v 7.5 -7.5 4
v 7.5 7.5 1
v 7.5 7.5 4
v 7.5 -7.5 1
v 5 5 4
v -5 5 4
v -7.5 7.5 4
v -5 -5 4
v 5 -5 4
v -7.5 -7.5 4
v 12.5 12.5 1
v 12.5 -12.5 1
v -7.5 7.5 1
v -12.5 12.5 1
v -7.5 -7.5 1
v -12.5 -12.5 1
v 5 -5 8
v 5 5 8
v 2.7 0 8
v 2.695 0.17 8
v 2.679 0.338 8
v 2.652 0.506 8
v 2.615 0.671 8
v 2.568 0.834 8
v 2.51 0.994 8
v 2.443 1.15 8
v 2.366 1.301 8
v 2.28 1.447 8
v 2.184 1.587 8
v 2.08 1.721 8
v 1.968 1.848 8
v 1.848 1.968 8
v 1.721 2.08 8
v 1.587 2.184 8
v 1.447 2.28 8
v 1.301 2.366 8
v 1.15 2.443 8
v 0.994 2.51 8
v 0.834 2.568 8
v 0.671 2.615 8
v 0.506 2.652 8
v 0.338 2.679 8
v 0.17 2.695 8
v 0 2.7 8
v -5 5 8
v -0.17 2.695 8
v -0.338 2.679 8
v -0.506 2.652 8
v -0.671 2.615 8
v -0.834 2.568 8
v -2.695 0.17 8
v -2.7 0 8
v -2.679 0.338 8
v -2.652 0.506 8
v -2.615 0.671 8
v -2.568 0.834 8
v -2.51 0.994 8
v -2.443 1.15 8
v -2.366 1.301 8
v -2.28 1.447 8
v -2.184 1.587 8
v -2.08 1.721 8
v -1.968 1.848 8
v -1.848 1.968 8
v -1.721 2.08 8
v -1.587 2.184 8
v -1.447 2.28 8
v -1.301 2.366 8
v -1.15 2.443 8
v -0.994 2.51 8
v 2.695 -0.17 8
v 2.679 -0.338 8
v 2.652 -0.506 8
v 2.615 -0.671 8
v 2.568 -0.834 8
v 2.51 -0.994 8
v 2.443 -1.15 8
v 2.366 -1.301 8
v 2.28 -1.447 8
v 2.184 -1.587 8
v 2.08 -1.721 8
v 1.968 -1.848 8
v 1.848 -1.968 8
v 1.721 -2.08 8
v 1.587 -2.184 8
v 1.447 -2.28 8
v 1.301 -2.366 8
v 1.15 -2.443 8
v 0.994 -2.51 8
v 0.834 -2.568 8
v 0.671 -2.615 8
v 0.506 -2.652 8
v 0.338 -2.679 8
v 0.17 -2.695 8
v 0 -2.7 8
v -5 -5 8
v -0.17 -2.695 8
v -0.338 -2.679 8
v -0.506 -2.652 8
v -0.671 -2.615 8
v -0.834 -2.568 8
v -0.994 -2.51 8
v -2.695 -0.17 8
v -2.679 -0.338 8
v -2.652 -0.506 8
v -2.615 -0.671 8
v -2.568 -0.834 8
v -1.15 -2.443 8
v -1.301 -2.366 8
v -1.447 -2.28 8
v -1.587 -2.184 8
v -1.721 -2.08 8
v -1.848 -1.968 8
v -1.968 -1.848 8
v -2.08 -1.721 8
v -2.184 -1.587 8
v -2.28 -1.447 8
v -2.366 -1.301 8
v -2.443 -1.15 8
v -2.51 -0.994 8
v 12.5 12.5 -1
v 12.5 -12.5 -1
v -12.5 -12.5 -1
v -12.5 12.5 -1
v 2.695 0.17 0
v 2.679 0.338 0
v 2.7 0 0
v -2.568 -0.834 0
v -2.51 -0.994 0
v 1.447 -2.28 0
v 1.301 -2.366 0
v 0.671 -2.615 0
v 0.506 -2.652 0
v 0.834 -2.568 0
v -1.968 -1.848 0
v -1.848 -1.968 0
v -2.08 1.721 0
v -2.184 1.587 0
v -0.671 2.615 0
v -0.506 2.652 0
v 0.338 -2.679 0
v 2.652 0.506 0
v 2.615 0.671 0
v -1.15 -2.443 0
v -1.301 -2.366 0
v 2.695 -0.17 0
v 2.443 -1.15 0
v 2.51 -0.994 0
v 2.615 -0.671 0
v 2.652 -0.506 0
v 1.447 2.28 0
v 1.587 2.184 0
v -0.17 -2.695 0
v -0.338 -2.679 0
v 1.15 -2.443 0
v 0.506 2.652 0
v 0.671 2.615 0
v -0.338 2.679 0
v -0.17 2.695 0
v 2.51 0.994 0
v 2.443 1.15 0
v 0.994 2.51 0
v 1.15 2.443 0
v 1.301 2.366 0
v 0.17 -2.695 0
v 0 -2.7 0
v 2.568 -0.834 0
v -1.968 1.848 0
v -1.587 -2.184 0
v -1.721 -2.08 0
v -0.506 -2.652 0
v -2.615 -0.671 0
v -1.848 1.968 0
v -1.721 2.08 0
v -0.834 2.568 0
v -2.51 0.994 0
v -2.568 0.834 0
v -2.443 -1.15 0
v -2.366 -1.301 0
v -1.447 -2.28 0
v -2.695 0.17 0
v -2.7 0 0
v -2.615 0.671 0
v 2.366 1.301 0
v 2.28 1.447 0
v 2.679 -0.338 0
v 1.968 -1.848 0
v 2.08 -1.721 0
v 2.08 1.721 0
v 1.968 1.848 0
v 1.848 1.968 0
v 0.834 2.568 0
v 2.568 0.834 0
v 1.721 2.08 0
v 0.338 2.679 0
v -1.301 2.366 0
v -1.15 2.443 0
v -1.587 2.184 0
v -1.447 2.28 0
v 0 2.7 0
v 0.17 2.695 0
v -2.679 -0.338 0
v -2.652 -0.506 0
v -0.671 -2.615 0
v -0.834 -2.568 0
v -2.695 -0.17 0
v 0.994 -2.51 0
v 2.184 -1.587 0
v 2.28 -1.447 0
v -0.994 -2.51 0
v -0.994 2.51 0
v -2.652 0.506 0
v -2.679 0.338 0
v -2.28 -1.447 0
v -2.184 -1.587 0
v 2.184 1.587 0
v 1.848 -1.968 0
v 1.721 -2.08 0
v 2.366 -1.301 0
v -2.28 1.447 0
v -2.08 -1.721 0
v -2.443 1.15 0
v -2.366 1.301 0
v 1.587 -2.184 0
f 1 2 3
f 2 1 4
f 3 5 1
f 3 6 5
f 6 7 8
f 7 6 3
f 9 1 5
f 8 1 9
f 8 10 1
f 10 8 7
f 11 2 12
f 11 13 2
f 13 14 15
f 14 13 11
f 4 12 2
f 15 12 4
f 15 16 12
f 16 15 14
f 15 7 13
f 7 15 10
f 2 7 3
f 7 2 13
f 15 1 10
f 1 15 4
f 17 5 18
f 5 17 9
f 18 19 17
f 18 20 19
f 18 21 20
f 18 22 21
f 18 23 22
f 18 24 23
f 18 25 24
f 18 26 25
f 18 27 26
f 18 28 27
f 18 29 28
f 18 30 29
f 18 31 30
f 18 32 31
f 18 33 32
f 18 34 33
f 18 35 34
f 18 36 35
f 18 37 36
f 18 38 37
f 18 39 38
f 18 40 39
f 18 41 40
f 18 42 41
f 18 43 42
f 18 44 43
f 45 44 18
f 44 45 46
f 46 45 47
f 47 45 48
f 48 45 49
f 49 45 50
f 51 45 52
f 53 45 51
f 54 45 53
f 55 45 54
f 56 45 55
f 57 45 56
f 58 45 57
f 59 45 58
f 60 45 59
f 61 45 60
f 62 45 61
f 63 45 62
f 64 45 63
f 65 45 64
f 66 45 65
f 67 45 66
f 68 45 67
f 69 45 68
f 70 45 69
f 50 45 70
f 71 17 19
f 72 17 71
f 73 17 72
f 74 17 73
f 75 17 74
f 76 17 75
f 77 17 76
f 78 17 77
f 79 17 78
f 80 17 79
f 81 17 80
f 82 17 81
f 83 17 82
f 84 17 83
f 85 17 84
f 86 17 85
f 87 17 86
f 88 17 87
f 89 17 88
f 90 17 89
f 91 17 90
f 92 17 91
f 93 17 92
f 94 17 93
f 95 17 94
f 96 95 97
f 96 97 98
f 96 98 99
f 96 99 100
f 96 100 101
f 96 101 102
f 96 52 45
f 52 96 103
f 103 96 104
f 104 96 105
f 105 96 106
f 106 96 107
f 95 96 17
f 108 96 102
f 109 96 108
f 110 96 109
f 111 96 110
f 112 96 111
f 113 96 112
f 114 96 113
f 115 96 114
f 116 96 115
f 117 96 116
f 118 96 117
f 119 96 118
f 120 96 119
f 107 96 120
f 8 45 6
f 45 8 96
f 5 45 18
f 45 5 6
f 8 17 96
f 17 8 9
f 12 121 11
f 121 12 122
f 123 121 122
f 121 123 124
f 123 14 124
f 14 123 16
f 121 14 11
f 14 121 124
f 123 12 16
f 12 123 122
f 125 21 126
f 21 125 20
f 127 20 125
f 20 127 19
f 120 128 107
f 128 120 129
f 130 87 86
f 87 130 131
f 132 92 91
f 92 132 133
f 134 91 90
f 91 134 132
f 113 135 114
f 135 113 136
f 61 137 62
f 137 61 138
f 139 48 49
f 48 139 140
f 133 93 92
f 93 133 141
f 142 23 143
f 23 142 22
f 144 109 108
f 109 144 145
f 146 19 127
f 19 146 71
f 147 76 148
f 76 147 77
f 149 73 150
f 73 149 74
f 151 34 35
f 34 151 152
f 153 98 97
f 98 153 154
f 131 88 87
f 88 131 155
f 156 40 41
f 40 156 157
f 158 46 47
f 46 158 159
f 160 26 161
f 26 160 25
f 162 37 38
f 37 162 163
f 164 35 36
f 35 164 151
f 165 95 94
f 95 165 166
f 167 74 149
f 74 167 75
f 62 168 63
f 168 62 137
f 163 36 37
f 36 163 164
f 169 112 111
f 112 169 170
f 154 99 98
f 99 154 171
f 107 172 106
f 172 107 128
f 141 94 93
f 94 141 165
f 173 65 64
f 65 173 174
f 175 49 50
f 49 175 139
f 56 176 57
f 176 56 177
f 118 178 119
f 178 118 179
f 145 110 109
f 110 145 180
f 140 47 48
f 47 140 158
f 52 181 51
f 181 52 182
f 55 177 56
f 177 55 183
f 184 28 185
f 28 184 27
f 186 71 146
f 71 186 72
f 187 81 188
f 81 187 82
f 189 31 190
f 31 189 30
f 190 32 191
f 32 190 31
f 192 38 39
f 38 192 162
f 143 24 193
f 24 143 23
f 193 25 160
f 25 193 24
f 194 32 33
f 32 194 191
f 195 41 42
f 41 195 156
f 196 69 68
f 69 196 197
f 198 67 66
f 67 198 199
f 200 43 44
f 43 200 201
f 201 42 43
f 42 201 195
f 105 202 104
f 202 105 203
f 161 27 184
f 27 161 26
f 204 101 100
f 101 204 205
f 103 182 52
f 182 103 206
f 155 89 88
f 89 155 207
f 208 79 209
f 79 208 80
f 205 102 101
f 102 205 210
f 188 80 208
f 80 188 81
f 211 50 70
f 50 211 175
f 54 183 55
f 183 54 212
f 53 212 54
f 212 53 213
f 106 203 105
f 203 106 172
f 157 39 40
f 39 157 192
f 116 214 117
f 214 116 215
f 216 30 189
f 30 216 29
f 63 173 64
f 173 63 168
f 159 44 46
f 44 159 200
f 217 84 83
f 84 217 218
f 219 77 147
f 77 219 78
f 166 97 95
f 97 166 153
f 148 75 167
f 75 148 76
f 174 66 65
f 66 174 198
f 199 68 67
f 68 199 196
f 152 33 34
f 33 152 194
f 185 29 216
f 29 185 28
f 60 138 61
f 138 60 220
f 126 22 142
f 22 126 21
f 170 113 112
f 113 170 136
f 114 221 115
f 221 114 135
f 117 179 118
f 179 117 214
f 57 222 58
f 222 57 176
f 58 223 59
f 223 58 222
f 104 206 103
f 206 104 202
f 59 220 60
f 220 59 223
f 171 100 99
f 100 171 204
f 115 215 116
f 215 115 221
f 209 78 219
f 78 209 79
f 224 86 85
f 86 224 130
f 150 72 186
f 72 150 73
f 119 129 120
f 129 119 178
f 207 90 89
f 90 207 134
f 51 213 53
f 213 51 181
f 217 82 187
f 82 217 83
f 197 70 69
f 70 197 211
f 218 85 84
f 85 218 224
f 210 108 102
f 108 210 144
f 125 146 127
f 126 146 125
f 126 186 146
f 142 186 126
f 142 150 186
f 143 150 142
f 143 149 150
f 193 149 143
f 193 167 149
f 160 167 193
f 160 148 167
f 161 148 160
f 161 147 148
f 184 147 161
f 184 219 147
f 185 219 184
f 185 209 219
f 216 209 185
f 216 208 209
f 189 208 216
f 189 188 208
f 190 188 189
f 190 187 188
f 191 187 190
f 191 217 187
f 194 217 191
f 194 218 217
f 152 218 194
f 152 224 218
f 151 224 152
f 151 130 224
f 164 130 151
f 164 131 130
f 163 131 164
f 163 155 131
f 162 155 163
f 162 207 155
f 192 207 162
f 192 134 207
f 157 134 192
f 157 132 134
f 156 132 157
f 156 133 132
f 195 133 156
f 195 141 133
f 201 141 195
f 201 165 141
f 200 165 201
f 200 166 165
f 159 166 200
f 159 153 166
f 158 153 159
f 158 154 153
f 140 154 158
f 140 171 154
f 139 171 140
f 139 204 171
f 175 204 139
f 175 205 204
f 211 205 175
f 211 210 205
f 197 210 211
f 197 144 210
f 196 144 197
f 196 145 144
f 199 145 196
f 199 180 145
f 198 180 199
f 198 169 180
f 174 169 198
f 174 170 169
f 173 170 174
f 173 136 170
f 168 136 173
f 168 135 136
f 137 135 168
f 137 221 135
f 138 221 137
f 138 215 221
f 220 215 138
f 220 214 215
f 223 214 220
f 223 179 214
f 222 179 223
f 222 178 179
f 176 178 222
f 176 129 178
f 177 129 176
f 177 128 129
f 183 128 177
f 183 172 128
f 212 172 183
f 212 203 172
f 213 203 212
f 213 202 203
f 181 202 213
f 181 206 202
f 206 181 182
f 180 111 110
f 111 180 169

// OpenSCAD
// file: relativity.scad
_digit = "0123456789";
_lowercase = "abcdefghijklmnopqrstuvwxyz";
_uppercase = "ABCDEFGHIJKLMNOPQRSTUVWXYZ";
_letter = str(_lowercase, _uppercase);
_alphanumeric = str(_letter, _digit);
_variable_safe = str(_alphanumeric, "_");
_whitespace = " \t\r\n";
_nonsymbol = str(_alphanumeric, _whitespace);

_regex_ops = "?*+&|";

_strings_version = 
	[2014, 3, 17];
function strings_version() =
	_strings_version;
function strings_version_num() =
	_strings_version.x * 10000 + _strings_version.y * 100 + _strings_version.z;






//returns a list representing the tokenization of an input string
//echo(tokenize("not(foo)"));
//echo(tokenize("foo bar baz  "));
_token_regex_ignore_space = _parse_rx("\\w+|\\S");
_token_regex = _parse_rx("\\w+|\\S|\\s+");
function tokenize(string, ignore_space=true) = 
    _tokenize(string, ignore_space? _token_regex_ignore_space : _token_regex);
function _tokenize(string, pattern) = 
    _grep(string, _index_of(string, pattern, regex=true));

function grep(string, pattern, ignore_case=false) = 		//string
    _grep(string, _index_of(string, _parse_rx(pattern), regex=true, ignore_case=ignore_case));
function _grep(string, indices) = 
    [for (index = indices)
        between(string, index.x, index.y)
    ];


function replace(string, replaced, replacement, ignore_case=false, regex=false) = 
	_replace(string, replacement, index_of(string, replaced, ignore_case=ignore_case, regex=regex));
    
function _replace(string, replacement, indices, i=0) = 
    i >= len(indices)?
        after(string, indices[len(indices)-1].y-1)
    : i == 0?
        str( before(string, indices[0].x), replacement, _replace(string, replacement, indices, i+1) )
    :
        str( between(string, indices[i-1].y, indices[i].x), replacement, _replace(string, replacement, indices, i+1) )
    ;


function split(string, seperator=" ", ignore_case = false, regex=false) = 
	_split(string, index_of(string, seperator, ignore_case=ignore_case, regex=regex));
    
function _split(string, indices, i=0) = 
    len(indices) == 0?
        [string]
    : i >= len(indices)?
        _coalesce_on(after(string, indices[len(indices)-1].y-1), "", [])
    : i == 0?
        concat( _coalesce_on(before(string, indices[0].x), "", []), _split(string, indices, i+1) )
    :
        concat( between(string, indices[i-1].y, indices[i].x), _split(string, indices, i+1) )
    ;

function contains(string, substring, ignore_case=false, regex=false) = 
	regex?
        _index_of_first(string, _parse_rx(substring), regex=regex, ignore_case=ignore_case) != undef
	:
		_index_of_first(string, substring, regex=regex, ignore_case=ignore_case) != undef
	; 
	


function index_of(string, pattern, ignore_case=false, regex=false) = 
	_index_of(string, 
        regex? _parse_rx(pattern) : pattern, 
        regex=regex, 
        ignore_case=ignore_case);
function _index_of(string, pattern, pos=0, regex=false, ignore_case=false) = 		//[start,end]
	pos == undef?
        undef
	: pos >= len(string)?
		[]
	:
        _index_of_recurse(string, pattern, 
            _index_of_first(string, pattern, pos=pos, regex=regex, ignore_case=ignore_case),
            pos, regex, ignore_case)
	;
function _index_of_recurse(string, pattern, index_of_first, pos, regex, ignore_case) = 
    index_of_first == undef?
        []
    : concat(
        [index_of_first],
        _coalesce_on(
            _index_of(string, pattern, 
                    pos = index_of_first.y,
                    regex=regex,
                    ignore_case=ignore_case),
            undef,
            [])
    );
function _index_of_first(string, pattern, pos=0, ignore_case=false, regex=false) =
	pos == undef?
        undef
    : pos >= len(string)?
		undef
	: _coalesce_on([pos, _match(string, pattern, pos, regex=regex, ignore_case=ignore_case)], 
		[pos, undef],
		_index_of_first(string, pattern, pos+1, regex=regex, ignore_case=ignore_case))
    ;
function _match(string, pattern, pos, regex=false, ignore_case=false) = 
    regex?
        _match_parsed_rx(string, pattern, pos, ignore_case=ignore_case)
    : starts_with(string, pattern, pos, ignore_case=ignore_case)? 
        pos+len(pattern) 
    : 
        undef
    ;
    
    
function starts_with(string, start, pos=0, ignore_case=false, regex=false) = 
	regex?
		_match_parsed_rx(string,
			_parse_rx(start), 
			pos, 
			ignore_case=ignore_case) != undef
	:
		equals(	substring(string, pos, len(start)), 
			start, 
			ignore_case=ignore_case)
	;
function ends_with(string, end, ignore_case=false) =
	equals(	after(string, len(string)-len(end)-1), 
		end,
		ignore_case=ignore_case)
	;







function _match_regex(string, pattern, pos=0, ignore_case=false) = 		//end pos
	_match_parsed_rx(string,
		_parse_rx(pattern), 
		pos, 
		ignore_case=ignore_case);
	
//converts an infix notated regex string to a parse tree using the shunting yard algorithm
function _parse_rx(	rx, 		ops=[], 	args=[], 				i=0) = 
	rx == undef?
		undef
	: i >= len(rx)?
		len(ops) <= 0?
			args[0]
		:
			_parse_rx(rx, _pop(ops), 	_push_rx_op(args, ops[0]), 		i)
			
			
	: ops[0] == "{"?
		rx[i] == "}"?
			_parse_rx(rx, _pop(ops), 	_push_rx_op(args, ops[0]), 		 i+1)
		: rx[i] == ","?
			_parse_rx(rx, ops, 		_swap(args, _push(args[0], "")), 	 i+1)
		: 
			_parse_rx(rx, ops, 		_swap(args, _swap(args[0], str(args[0][0], rx[i]))), i+1)
			
			
	: ops[0] == "[" || ops[0] == "[^"?
		rx[i] == "]"?
			_parse_rx(rx, _pop(ops), 	_push_rx_op(args, ops[0]), 		i+1)
		: rx[i] == "\\"?
			_parse_rx(rx, ops, 		_swap(args, _push(args[0],rx[i+1])), 	i+2)
		: rx[i] == "-"?
			_parse_rx(rx, ops, 		_swap(args, _push(_pop(args[0]), ["-", args[0][0], rx[i+1]])), i+2)
		:
			_parse_rx(rx, ops, 		_swap(args, _push(args[0], rx[i])), 	i+1)
	: rx[i] == "[" && rx[i+1] == "^"?
		!_can_concat(rx, i)?
			_parse_rx(rx, _push(ops, "[^"),	_push(args, []),	 		i+2)
		: _can_shunt(ops, "&")?
			_parse_rx(rx, _push(_push(ops,"&"),"[^"), _push(args, []), i+2)
		:
			_parse_rx(rx, _pop(ops), 	_push_rx_op(args, ops[0]), 		i)
	: rx[i] == "["?
		!_can_concat(rx, i)?
			_parse_rx(rx, _push(ops, "["), 	_push(args, []),	 		i+1)
		: _can_shunt(ops, "&")?
			_parse_rx(rx, _push(_push(ops,"&"),"["), _push(args, []), i+1)
		:
			_parse_rx(rx, _pop(ops), 	_push_rx_op(args, ops[0]), 		i)
			
	: rx[i] == "{"?
			_parse_rx(rx, _push(ops, "{"),	_push(args, ["", []]), 			i+1)
			
			
	: is_in(rx[i], _regex_ops)?
		_can_shunt(ops, rx[i])?
			_parse_rx(rx, _push(ops, rx[i]), args, 		 		i+1)
		:
			_parse_rx(rx, _pop(ops), 	_push_rx_op(args, ops[0]), 		i)
	: rx[i] == ")"?
		ops[0] == "(" ?
			_parse_rx(rx, _pop(ops), 	args,			 		i+1)
		: len(ops) <= 0 ?
			_parse_rx(rx, ops, 		args,			 		i+1)
		: 
			_parse_rx(rx, _pop(ops), 	_push_rx_op(args, ops[0]), 		i)
	: rx[i] == "("?
		!_can_concat(rx, i)?
			_parse_rx(rx, _push(ops, "("), 	args, 		 			i+1)
		: _can_shunt(ops, "&")?
			_parse_rx(rx, _push(_push(ops, "&"), "("), args, 	 		i+1)
		:
			_parse_rx(rx, _pop(ops), 	_push_rx_op(args, ops[0]), 		i)
	: rx[i] == "\\"?
		!_can_concat(rx, i)?
			_parse_rx(rx, ops, 			_push(args,str(rx[i],rx[i+1])),	i+2)
		: _can_shunt(ops, "&")?
			_parse_rx(rx, _push(ops, "&"),	_push(args,str(rx[i],rx[i+1])),	i+2)
		:
			_parse_rx(rx, _pop(ops), 	_push_rx_op(args, ops[0]), 		i)
	:
		!_can_concat(rx, i)?
			_parse_rx(rx, ops, 		_push(args, rx[i]),	 		i+1)
		: _can_shunt(ops, "&")?
			_parse_rx(rx, _push(ops, "&"),	_push(args, rx[i]),	 		i+1)
		:
			_parse_rx(rx, _pop(ops), 	_push_rx_op(args, ops[0]), 		i)
	;

	
function _can_concat(regex, i) = 
	regex[i-1] != undef &&
	(!is_in(regex[i-1], "|(") || regex[i-2] == "\\");
	
function _can_shunt(stack, op) = 
	stack[0] == "(" || 
	len(stack) <= 0 || 
	_precedence(op, _regex_ops) < _precedence(stack[0], _regex_ops);
	
function _push_rx_op(stack, op) = 
	is_in(op[0], "[?*+")? // is unary?
		_push(_pop(stack), 	[op, stack[0]])
	: 		 	// is binary?
		_push(_pop(stack,2), 	[op, stack[1][0], stack[0], ])
	;

function _swap(stack, replacement) = 
	_push(_pop(stack), replacement);
function _pop(stack, n=1) = 
	n <= 1?
		len(stack) <=0? [] : stack[1]
	:
		_pop(_pop(stack), n-1)
	;
function _push(stack, char) = 
	[char, stack];

function _precedence(op, ops) = 
	search(op, ops)[0];
	
function _match_parsed_rx(string, regex, string_pos=0, ignore_case=false) = 
	//INVALID INPUT
	string == undef?
		undef
	
	//string length and anchors
	: regex == "^"?
		string_pos == 0?
			string_pos
		:
			undef
	: regex == "$"?
		string_pos >= len(string)?
			string_pos
		:
			undef
	: string_pos == undef?
		undef
	: string_pos >= len(string)?
		undef
		
	//ALTERNATION
	: regex[0] == "|" ?
		_null_coalesce(
			_match_parsed_rx(string, regex[1], string_pos, ignore_case=ignore_case),
			_match_parsed_rx(string, regex[2], string_pos, ignore_case=ignore_case)
		)

	//KLEENE STAR
	: regex[0] == "*" ?
		_match_repetition(string, regex[1],
			0, undef,
			string_pos,
			ignore_case=ignore_case)

	//KLEENE BRACKETS
	: regex[0] == "{" ?
		regex[2][1][0] == undef?
			_match_repetition(string, regex[1],
				_parse_int(regex[2][0], 10), undef,
				string_pos,
				ignore_case=ignore_case)
		:
			_match_repetition(string, regex[1],
				_parse_int(regex[2][1][0], 10), _parse_int(regex[2][0], 10),
				string_pos,
				ignore_case=ignore_case)
		
	//KLEENE PLUS
	: regex[0] == "+" ?
		_match_repetition(string, regex[1],
			1, undef,
			string_pos,
			ignore_case=ignore_case)

	//OPTION
	: regex[0] == "?" ?
		_match_repetition(string, regex[1],
			0, 1,
			string_pos,
			ignore_case=ignore_case)

	//CONCATENATION
	: regex[0] == "&" ?	
		_match_parsed_rx(string, regex[2], 
			_match_parsed_rx(string, regex[1], string_pos, ignore_case=ignore_case), 
			ignore_case=ignore_case)
			
	//ESCAPE CHARACTER
	: regex == "\\d"?
		is_in(string[string_pos], _digit)?
			string_pos+1
		: 
			undef
	: regex == "\\s"?
		is_in(string[string_pos], _whitespace)?
			string_pos+1
		: 
			undef
	: regex == "\\w"?
		is_in(string[string_pos], _alphanumeric)?
			string_pos+1
		: 
			undef
	: regex == "\\D"?
		!is_in(string[string_pos], _digit)?
			string_pos+1
		: 
			undef
				
	: regex == "\\S"?
		!is_in(string[string_pos], _whitespace)?
			string_pos+1
		: 
			undef
	: regex == "\\W"?
		!is_in(string[string_pos], _alphanumeric)?
			string_pos+1
		: 
			undef
	: regex[0] == "\\"?
		string[string_pos] == regex[0][1]?
			string_pos+1
		:
			undef
	
	//CHARACTER SET
	: regex[0] == "[" ?
		_is_in_stack(string[string_pos], regex[1], ignore_case=ignore_case)?
			string_pos+1
		:
			undef
	//NEGATIVE CHARACTER SET
	: regex[0] == "[^" ?
		!_is_in_stack(string[string_pos], regex[1], ignore_case=ignore_case)?
			string_pos+1
		:
			undef
		
	//LITERAL
	: equals(string[string_pos], regex, ignore_case=ignore_case) ?
		string_pos+1
	
	//WILDCARD
	: regex == "."?
		string_pos+1
	
	//NO MATCH
	: 
		undef
	;


function is_empty(string) = 
	string == "";

function is_null_or_empty(string) = 
	string == undef || string == "";
	
function is_null_or_whitespace(string) = 
	string == undef || trim(string) == "";

function trim(string) = 
	string == undef?
		undef
	: string == ""?
		""
	:
		_null_coalesce(
			between(string, _match_set(string, _whitespace, 0), 
					_match_set_reverse(string, _whitespace, len(string))),
			""
		)
	;

function _match_repetition(string, regex, min_reps, max_reps, pos, ignore_case=false) = 
    pos == undef?
        undef
    : pos > len(string)?
        undef
	: _null_coalesce(
		_match_repetition(string, regex, min_reps-1, max_reps-1, 
			_match_parsed_rx(string, regex, pos, ignore_case=ignore_case), 
            ignore_case=ignore_case),
		(min_reps== undef || min_reps <= 0) && (max_reps == undef || max_reps >= 0)?
			pos
		: 
			undef
	);
	
function _match_set(string, set, pos) = 
	pos >= len(string)?
		len(string)
	: is_in(string[pos], set )?
		_match_set(string, set, pos+1)
	: 
		pos
	;

function _match_set_reverse(string, set, pos) = 
	pos <= 0?
		0
	: is_in(string[pos-1], set)?
		_match_set_reverse(string, set, pos-1)
	: 
		pos
	;

function _match_quote(string, quote_char, pos) = 
	pos >= len(string)?
		len(string)
	: string[pos] == quote_char?
		pos
	: string[pos] == "\\"? 
		_match_quote(string, quote_char, pos+2)
	: 
		_match_quote(string, quote_char, pos+1)
	;

	
function _is_in_range(char, min_char, max_char) = 
	search(char, _alphanumeric,0)[0][0] >= search(min_char, _alphanumeric,0)[0][0] &&
	search(char, _alphanumeric,0)[0][0] <= search(max_char, _alphanumeric,0)[0][0];
function _is_in_stack(string, stack, ignore_case=false) = 
	stack == undef?
		false
	: len(stack) <= 0?
		false
	: stack[0][0] == "-"?
		_is_in_range(string, stack[0][1], stack[0][2])
	: string == stack[0]?
		true
	: ignore_case && lower(string) == lower(stack[0])?
		true
	:
		_is_in_stack(string, _pop(stack), ignore_case=ignore_case)
	;

function equals(this, that, ignore_case=false) = 
	ignore_case?
		lower(this) == lower(that)
	:
		this==that
	;

function lower(string) = 
	_transform_case(string, search(string, "ABCDEFGHIJKLMNOPQRSTUVWXYZ",0), 97);

function upper(string) = 
	_transform_case(string, search(string, "abcdefghijklmnopqrstuvwxyz",0), 65);

//TODO: convert to list comprehensions
function _transform_case(string, encodings, offset) = 
    join([for (i = [0:len(encodings)-1])
            len(encodings[i]) > 0?
                chr(encodings[i][0] + offset)
            :
                string[i]
    ])
	;


function reverse(string) = 
	string == undef?
		undef
	: len(string) <= 0?
		""
	: 
        join([for (i = [0:len(string)-1]) string[len(string)-1-i]])
    ;

function substring(string, start, length=undef) = 
	length == undef? 
		between(string, start, len(string)) 
	: 
		between(string, start, length+start)
	;

//note: start is inclusive, end is exclusive
function between(string, start, end) = 
	string == undef?
		undef
	: start == undef?
		undef
	: start > len(string)?
		undef
	: start < 0?
		before(string, end)
	: end == undef?
		undef
	: end < 0?
		undef
	: end > len(string)?
		after(string, start-1)
	: start > end?
		undef
	: start == end ? 
		"" 
	: 
        join([for (i=[start:end-1]) string[i]])
	;

function before(string, index=0) = 
	string == undef?
		undef
	: index == undef?
		undef
	: index > len(string)?
		string
	: index <= 0?
		""
	: 
        join([for (i=[0:index-1]) string[i]])
	;

function after(string, index=0) =
	string == undef?
		undef
	: index == undef?
		undef
	: index < 0?
		string
	: index >= len(string)-1?
		""
	:
        join([for (i=[index+1:len(string)-1]) string[i]])
	;
	

	

function parse_int(string, base=10, i=0, nb=0) = 
	string[0] == "-" ? 
		-1*_parse_int(string, base, 1) 
	: 
		_parse_int(string, base);

function _parse_int(string, base, i=0, nb=0) = 
	i == len(string) ? 
		nb 
	: 
		nb + _parse_int(string, base, i+1, 
				search(string[i],"0123456789ABCDEF")[0]*pow(base,len(string)-i-1));
                
function join(strings, delimeter="") = 
	strings == undef?
		undef
	: strings == []?
		""
	: _join(strings, len(strings)-1, delimeter, 0);
function _join(strings, index, delimeter) = 
	index==0 ? 
		strings[index] 
	: str(_join(strings, index-1, delimeter), delimeter, strings[index]) ;
	
function is_in(string, list, ignore_case=false) = 
	string == undef?
		false
    : 
        any([ for (i = [0:len(list)-1]) equals(string, list[i], ignore_case=ignore_case) ])
	;
function any(booleans, index=0) = 
    index > len(booleans)?
        false
    : booleans[index]?
        true
    :
        any(booleans, index+1)
    ;
function all(booleans, index=0) = 
	index >= len(booleans)?
		true
	: !booleans[index]?
		false
	: 
		all(booleans, index+1)
	;

function _null_coalesce(string, replacement) = 
	string == undef?
		replacement
	:
		string
	;
function _coalesce_on(value, error, fallback) = 
	value == error?
		fallback
	: 
		value
	;
	

















function relativity_version() =
	[2015, 11, 26];
function relativity_version_num() = 
	relativity_version().x * 10000 + relativity_version().y * 100 + relativity_version().z;
echo(str("relativity.scad ", relativity_version().x, ".", relativity_version().y, ".", relativity_version().z));

if(version_num() < 20150000)
	echo("WARNING: relativity.scad requires OpenSCAD version 2015.03 or higher");


// an arbitrarily large number
// must be finite to allow use in geometric operations
// interaction between objects of indeterminate size results in undefined behavior
indeterminate = 1e6;

// an arbitrarily small number
// must be nonzero to meet the assumptions of the library

infinitesimal = 0.001;

// helper variables for aligning along the z axis
top = [0,0,1];
center=[0,0,0];
bottom = [0,0,-1];
up = [0,0,1];
down = [0,0,-1];
x = [1,0,0];
y = [0,1,0];
z = [0,0,1];

// properties of the last instance of rod/box/ball in the call stack
$parent_size=[0,0,0];
$parent_bounds=[0,0,0];
$parent_radius=0;
$parent_type="space";
// a stack of classes used by all ancestors
$_ancestor_classes = [];
_token_regex_ignore_dash = _parse_rx("(\\w|-)+|\\S");

//inhereted properties common to all geometric primitives in relativity.scad
// indicates the class(es) to render
$_show = "*";
// indicates the class that is either assigned-to or inherited-by an object
$class = [];
// indicates the absolute position of a primitive
$position = [0,0,0];
// a vector indicating the direction of a parent object		
$inward = [0,0,0];		
$outward = [0,0,0];

//hadamard product (aka "component-wise" product) for vectors
function hadamard(v1,v2) = [v1.x*v2.x, v1.y*v2.y, v1.z*v2.z];



module selectable(){
    _assign(
        $_ancestor_classes = _push($_ancestor_classes, 
            _tokenize($class, _token_regex_ignore_dash)
        )
    )
    if(_sizzle_engine($_ancestor_classes, $_show))  
        children();
}

module _child_wrapper(){
    for (i = [0 : $children-1]){
        //selectable()
        children(i);
    }
}

// form repeating patterns through translation
module translated(offsets, n=[1], class="*"){
	offsets = len(offsets.x) == undef && offsets.x != undef? [offsets] : offsets;
	for(offset=offsets)
	{
        show(class)
        for(i=n)
            _translate(offset*i)
                _child_wrapper() children();
        hide(class)
            _child_wrapper() children();
    }
}

// form radially symmetric objects around the z axis
module rotated(offsets, n=[1], class="*"){
	offsets = len(offsets.x) == undef && offsets.x != undef? [offsets] : offsets;
	for(offset=offsets)
	{
        show(class)
        for(i=n)
            rotate(offset*i)
                _child_wrapper() children();
        hide(class)
            _child_wrapper() children();
    }
}

// form bilaterally symmetric objects using the mirror() function
module mirrored(axes=[0,0,0], class="*"){
	axes = len(axes.x) == undef && axes.x != undef? [axes] : axes;
	for(axis=axes)
	{
        show(class)
        mirror(axis)
            _child_wrapper() children();
        show(class)
            _child_wrapper() children();
        hide(class)
            _child_wrapper() children();
    }
}

module attach(class){
	_assign($_ancestor_classes = _push($_ancestor_classes, _tokenize($class, _token_regex_ignore_dash)))
	_assign($_show=["and", $_show, ["descendant", "*", _sizzle_parse(class)]])
	_child_wrapper() children();
}

module show(class="*"){
	_assign($_show=["and", $_show, _sizzle_parse(class)])
	_child_wrapper() children();
}

module hide(class="*"){
	_assign($_show=["and", $_show, ["not", _sizzle_parse(class)]])
	_child_wrapper() children();
}

module colored(color, class="*"){
	_assign($_show=["and", $_show, _sizzle_parse(class)])
	color(color)
	_child_wrapper() children();
	
	hide(class)
	_child_wrapper() children();
}

module scaled(v=[0,0,0], class="*"){
	_assign($_show=["and", $_show, _sizzle_parse(class)])
	scale(v)
	_child_wrapper() children();
	
	hide(class)
	_child_wrapper() children();
}

module resized(newsize, class="*"){
	_assign($_show=["and", $_show, _sizzle_parse(class)])
	resize(newsize)
	_child_wrapper() children();
	
	hide(class)
	_child_wrapper() children();
}

module hulled(class="*"){
    _assign($_ancestor_classes = _push($_ancestor_classes, _tokenize($class, _token_regex_ignore_dash)))
	if(_sizzle_engine($_ancestor_classes, $_show))
	hull()
	_assign($_show=_sizzle_parse(class))
	_child_wrapper() children();
	
	hide(class)
	_child_wrapper() children();
}

// performs the union on objects marked as positive space (i.e. objects where $class = positive), 
// and performs the difference for objects marked as negative space (i.e objects where $class = $negative)
module differed(negative, positive="*", unaffected=undef){
	_positive = _sizzle_parse(positive);
	_negative = _sizzle_parse(negative);
	_unaffected = unaffected != undef? 
        _sizzle_parse(unaffected) : ["not", ["or", _positive, _negative]];
    
    _assign($_ancestor_classes = _push($_ancestor_classes, _tokenize($class, _token_regex_ignore_dash)))
    if(_sizzle_engine($_ancestor_classes, $_show))
    difference(){
        _assign($_show = _positive)
            _child_wrapper() children();
        _assign($_show = _negative)
            _child_wrapper() children();
    }
    _assign($_show=["and", $_show, _unaffected])
        _child_wrapper() children();
}

// performs the intersection on a list of object classes
module intersected(class1, class2, unaffected=undef){
	class1 = _sizzle_parse(class1);
	class2 = _sizzle_parse(class2);
	unaffected = unaffected != undef? 
		unaffected : ["not", ["or", class1, class2]];
    
    _assign($_ancestor_classes = _push($_ancestor_classes, _tokenize($class, _token_regex_ignore_dash)))
    if(_sizzle_engine($_ancestor_classes, $_show))
    intersection(){
        _assign($_show = class1)
            _child_wrapper() children();
        _assign($_show = class2)
            _child_wrapper() children();
    }
    _assign($_show=["and", $_show, unaffected])
        _child_wrapper() children();
}

// like translate(), but use positions relative to the size of the parent object
// if tilt==true, child objects will also be oriented away from the parent object's center
module align(anchors, bounds="box"){
	anchors = len(anchors.x)==undef && anchors.x!= undef? [anchors] : anchors;
	for(anchor=anchors)
	{
		if(bounds == "box")
		_translate(hadamard(anchor, $parent_bounds)/2)
		_assign($outward = anchor, $inward = -anchor)
			_child_wrapper() children();
		
		if(bounds == "ball"){
			_anchor = _rotate_matrix(_orient_angles(anchor)) * [0,0,1,1];
			_translate(hadamard(_anchor, $parent_bounds)/2)
			_assign($outward = anchor, $inward = -anchor)
				_child_wrapper() children();
		}
	}
}

// like rotate(), but works by aligning the zaxis to a given vector
module orient(zaxes, roll=0){
	zaxes = len(zaxes.x) == undef && zaxes.x != undef? [zaxes] : zaxes;
	for(zaxis=zaxes)
	{
		rotate(_orient_angles(zaxis))
		rotate(roll*z)
			_child_wrapper() children();
	}
}

// duplicates last instance of box/rod/ball in the call stack
// useful for performing hull() or difference() between parent and child 
module parent(size=undef, anchor=center){
	echo("WARNING: parent() module is depreciated. Please use CSG operators such as differed() and hulled().");
	size = size==undef? $parent_size : size;
	if($parent_type=="box") 
		box(size, anchor=anchor)
			children();
	else if($parent_type=="rod")
		rod(size, anchor=anchor)
			children();
	else if($parent_type=="ball")
		ball(size, anchor=anchor)
			children();
}

// wrapper for cube with enhanced centering functionality and cascading children
module box(	size=[1,1,1], 
			h=undef, d=undef, r=undef, 
			anchor=$inward, bounds="box") {
    
	d = r!=undef? 2*r : d;
	size =	len(size)==undef && size!= undef? 
                [size,size,size] 
            : d != undef && h == undef? 
                [d,d,indeterminate] 
            : d == undef && h != undef? 
                [indeterminate, indeterminate, h] 
            : d != undef && h != undef?
                [d,d,h] 
            : 
                size
            ;
                
	_assign($parent_size = size, 
			$parent_type="box", 
			$parent_bounds=[size.x < indeterminate/2? size.x : 0,
							size.y < indeterminate/2? size.y : 0,
							size.z < indeterminate/2? size.z : 0],
			$parent_radius=sqrt(pow(size.x/2,2) + pow(size.y/2,2) + pow(size.z/2,2)),
			$_ancestor_classes = _push($_ancestor_classes, _tokenize($class, _token_regex_ignore_dash)),
			$inward=center, 
			$outward=center){
		_translate(-hadamard(anchor, $parent_size)/2)
			if(_sizzle_engine($_ancestor_classes, $_show)) cube($parent_size, center=true);
		_translate(-hadamard(anchor, $parent_bounds)/2)
			_child_wrapper() children();
	}
}
// wrapper for cylinder with enhanced centering functionality and cascading children
module rod(	size=[1,1,1], 
			h=undef, d=undef, r=undef, 
			anchor=$inward, orientation=top, bounds="rod") {
                
	d = r!=undef? 2*r : d;
	size =	len(size)==undef && size!= undef? 
                [size,size,size] 
            : d != undef && h == undef? 
                [d,d,indeterminate] 
            : d == undef && h != undef? 
                [indeterminate, indeterminate, h] 
            : d != undef && h != undef?
                [d,d,h] 
            : 
                size
            ;
    _bounds = _rotate_matrix(_orient_angles(orientation)) * [size.x,size.y,size.z,1];
                
	_assign($parent_size = size, 
			$parent_type="rod",
			$parent_bounds=[abs(_bounds.x) < indeterminate/2? abs(_bounds.x) : 0,
							abs(_bounds.y) < indeterminate/2? abs(_bounds.y) : 0,
							abs(_bounds.z) < indeterminate/2? abs(_bounds.z) : 0],
			$parent_radius=sqrt(pow(h/2,2)+pow(d/2,2)),
			$_ancestor_classes = _push($_ancestor_classes, _tokenize($class, _token_regex_ignore_dash)),
			$inward=center, 
			$outward=center){
		_translate(-hadamard(anchor, [abs(_bounds.x),abs(_bounds.y),abs(_bounds.z)])/2){
			if(_sizzle_engine($_ancestor_classes, $_show))
				orient(orientation) 
				resize($parent_size) 
				cylinder(d=$parent_size.x, h=$parent_size.z, center=true);
		}
		_translate(-hadamard(anchor, $parent_bounds)/2)
			_child_wrapper() children();
	}
}
// wrapper for cylinder with enhanced centering functionality and cascading children
module ball(size=[1,1,1], 
			h=undef, d=undef, r=undef, 
			anchor=$inward, bounds="ball") {
	//diameter is used internally to simplify the maths
	d = r!=undef? 2*r : d;
	size =	len(size)==undef && size!= undef? 
                [size,size,size] 
            : d != undef && h == undef? 
                [d,d,d] 
            : d == undef && h != undef? 
                [h, h, h] 
            : d != undef && h != undef?
                [d,d,h] 
            : 
                size
            ;
                
	_assign($parent_size = size, 
			$parent_type="ball", 
			$parent_bounds=[size.x < indeterminate/2? size.x : 0,
							size.y < indeterminate/2? size.y : 0,
							size.z < indeterminate/2? size.z : 0],
			$parent_radius=sqrt(pow(size.x/2,2) + pow(size.y/2,2) + pow(size.z/2,2)),
			$_ancestor_classes = _push($_ancestor_classes, _tokenize($class, _token_regex_ignore_dash)),
			$inward=center, 
			$outward=center ){
		_translate(-hadamard(anchor, $parent_size)/2)
			if(_sizzle_engine($_ancestor_classes, $_show)) 
                resize($parent_size) 
                sphere(d=$parent_size.x, center=true);
		_translate(-hadamard(anchor, $parent_bounds)/2)
			_child_wrapper() children();
	}
}




module _assign(){
    children();
}

//matrix rotation functions
function _rotate_x_matrix(a)=
							[[1,0,0,0], 
                      [0,cos(a),-sin(a),0], 
                      [0,sin(a),cos(a),0], 
                      [0,0,0,1]]; 

function _rotate_y_matrix(a)=
							[[cos(a),0,sin(a),0], 
                      [0,1,0,0], 
                      [-sin(a),0,cos(a),0], 
                      [0,0,0,1]]; 

function _rotate_z_matrix(a)=
							[[cos(a),-sin(a),0,0], 
                      [sin(a),cos(a),0,0], 
                      [0,0,1,0], 
                      [0,0,0,1]]; 

function _rotate_matrix(a)=_rotate_z_matrix(a.z)*_rotate_y_matrix(a.y)*_rotate_x_matrix(a.x);

function _orient_angles(zaxis)=
				[-asin(zaxis.y / norm(zaxis)),
		  		 atan2(zaxis.x, zaxis.z),
		  		 0];

//private wrapper for translate(), tracks the position of children using a special variable, $position
module _translate(offset){
	_assign($position = $position + offset)
	translate(offset)
	children();
}
	
        
//echo(_sizzle_parse("not(foo,bar)"));
//echo(_sizzle_parse("baz"));
//echo(_sizzle_parse("bar baz"));
//echo(_sizzle_engine([["baz", []],[]], _sizzle_parse("baz")));
//echo(_sizzle_engine([["baz", []],[]], _sizzle_parse("foo,bar")));
//echo(_sizzle_engine([["baz", []],[]], _sizzle_parse("not(foo,bar)")));
//echo(_sizzle_engine([["bar", []],[]], _sizzle_parse("not(foo,bar)")));
//echo(_sizzle_engine([["baz", []], [["bar", []],[]]], _sizzle_parse("bar baz")));
function _sizzle_engine_ancestor(ancestors, sizzle) = 
        //return true if any ancestor matches the sizzle
        len(ancestors) <= 0?
            false
        : _sizzle_engine(_push([], ancestors[0]), sizzle)?
            true
        : 
            _sizzle_engine_ancestor(_pop(ancestors), sizzle)
        ;
function _sizzle_engine(classes, sizzle) = 
	//is sizzle a string?
	sizzle == str(sizzle)?
		sizzle != "" && (sizzle == "*" || _has_token(classes[0], sizzle))
	//is sizzle a known operator?
	: sizzle[0] == "or"?
		_sizzle_engine(classes, sizzle[1]) || _sizzle_engine(classes, sizzle[2])
	: sizzle[0] == "not"?
		!_sizzle_engine(classes, sizzle[1])
	: sizzle[0] == "and"?
		_sizzle_engine(classes, sizzle[1]) && _sizzle_engine(classes, sizzle[2])
	: sizzle[0] == "descendant"? // parameters: descendant, ancestor
		_sizzle_engine(_push([], classes[0]), sizzle[1]) && _sizzle_engine_ancestor(_pop(classes), sizzle[2])
	: sizzle[0] == "child"? // parameters: child, parent
		_sizzle_engine(_push([], classes[0]), sizzle[1]) && _sizzle_engine_ancestor(_push([], _pop(classes)[0]), sizzle[2])
	: //invalid syntax
		false
	;

_sizzle_token_regex = _parse_rx("(\\w|_|-)+|\\S|\\s+");
function _sizzle_parse(sizzle) = 
	sizzle == ""?
		""
	: 
		_sizzle_DFA(
			_tokenize(sizzle, _sizzle_token_regex)
		)
    ;

//echo(_sizzle_DFA(_tokenize("not(foo,bar)")));
//echo(_sizzle_DFA(_tokenize("foo,bar baz")));
//echo(_sizzle_DFA(_tokenize("foo bar,baz")));
//echo(_sizzle_DFA(_tokenize("foo.bar,baz")));
//simulates a deterministic finite automaton that parses tokenized sizzle strings
function _sizzle_DFA(in, ops=[], args=[], pos=0) = 
	pos >= len(in)?
		len(ops) <= 0?
			args[0]
		:
			_sizzle_DFA(in,	_pop(ops),			_push_sizzle_op(args, ops[0]), pos)
	:in[pos] == "not"?
			_sizzle_DFA(in,	_push(ops, "not"),	args, 					pos+1)
	:in[pos] == ","?
			_sizzle_DFA(in,	_push(ops, "or"),	args, 					pos+1)
	:in[pos] == "."?
			_sizzle_DFA(in,	_push(ops, "and"),	args, 					pos+1)
	:in[pos] == ">"?
			_sizzle_DFA(in,	_push(ops, "child"),args, 					pos+1)
    :trim(in[pos]) == ""?
			_sizzle_DFA(in,	_push(ops, "descendant"),args, 				pos+1)
	:in[pos] == "("?
			_sizzle_DFA(in,	_push(ops, "("),	args, 					pos+1)
	:in[pos] == ")"?
		ops[0] == "("?
			_sizzle_DFA(in,	_pop(ops),			args, 					pos+1)
		:
			_sizzle_DFA(in,	_pop(ops),			_push_sizzle_op(args, ops[0]), pos)
	:
			_sizzle_DFA(in,	ops,                _push(args, in[pos]), 	pos+1)
	;
        
function _push_sizzle_op(args, op) = 
	op == "or" || op == "and" || op == "descendant" || op == "child"?
		_push(
			_pop(args, 2),
			[op, args[0], args[1][0]]
		)
	:			//unary
		_push(
			_pop(args),
			[op, args[0]]
		)
	;
	
//echo(_has_token(["baz",[]], "baz"));
//echo(_has_token(tokenize("foo bar baz"), "baz"));
function _has_token(tokens, token) = 
	tokens == undef || len(tokens) <= 0?
		false
	: 
        any([for (i = [0:len(tokens)-1]) tokens[i] == token])
	;	
// main file
include <relativity.scad>

radio_borde = 10/2;
radio_pajita = 5.4/2;
altura = 20;
difference() {
  base();
  taladro();
}

module taladro(diametro) {
  cylinder(r=radio_pajita, h=altura, $fn=100);
}

module base(altura) {
  union() {
    box([25,25,2])
    align(top)
    box([15,15,3])
    align(top)
    box([10, 10, 4]);
  }
}
